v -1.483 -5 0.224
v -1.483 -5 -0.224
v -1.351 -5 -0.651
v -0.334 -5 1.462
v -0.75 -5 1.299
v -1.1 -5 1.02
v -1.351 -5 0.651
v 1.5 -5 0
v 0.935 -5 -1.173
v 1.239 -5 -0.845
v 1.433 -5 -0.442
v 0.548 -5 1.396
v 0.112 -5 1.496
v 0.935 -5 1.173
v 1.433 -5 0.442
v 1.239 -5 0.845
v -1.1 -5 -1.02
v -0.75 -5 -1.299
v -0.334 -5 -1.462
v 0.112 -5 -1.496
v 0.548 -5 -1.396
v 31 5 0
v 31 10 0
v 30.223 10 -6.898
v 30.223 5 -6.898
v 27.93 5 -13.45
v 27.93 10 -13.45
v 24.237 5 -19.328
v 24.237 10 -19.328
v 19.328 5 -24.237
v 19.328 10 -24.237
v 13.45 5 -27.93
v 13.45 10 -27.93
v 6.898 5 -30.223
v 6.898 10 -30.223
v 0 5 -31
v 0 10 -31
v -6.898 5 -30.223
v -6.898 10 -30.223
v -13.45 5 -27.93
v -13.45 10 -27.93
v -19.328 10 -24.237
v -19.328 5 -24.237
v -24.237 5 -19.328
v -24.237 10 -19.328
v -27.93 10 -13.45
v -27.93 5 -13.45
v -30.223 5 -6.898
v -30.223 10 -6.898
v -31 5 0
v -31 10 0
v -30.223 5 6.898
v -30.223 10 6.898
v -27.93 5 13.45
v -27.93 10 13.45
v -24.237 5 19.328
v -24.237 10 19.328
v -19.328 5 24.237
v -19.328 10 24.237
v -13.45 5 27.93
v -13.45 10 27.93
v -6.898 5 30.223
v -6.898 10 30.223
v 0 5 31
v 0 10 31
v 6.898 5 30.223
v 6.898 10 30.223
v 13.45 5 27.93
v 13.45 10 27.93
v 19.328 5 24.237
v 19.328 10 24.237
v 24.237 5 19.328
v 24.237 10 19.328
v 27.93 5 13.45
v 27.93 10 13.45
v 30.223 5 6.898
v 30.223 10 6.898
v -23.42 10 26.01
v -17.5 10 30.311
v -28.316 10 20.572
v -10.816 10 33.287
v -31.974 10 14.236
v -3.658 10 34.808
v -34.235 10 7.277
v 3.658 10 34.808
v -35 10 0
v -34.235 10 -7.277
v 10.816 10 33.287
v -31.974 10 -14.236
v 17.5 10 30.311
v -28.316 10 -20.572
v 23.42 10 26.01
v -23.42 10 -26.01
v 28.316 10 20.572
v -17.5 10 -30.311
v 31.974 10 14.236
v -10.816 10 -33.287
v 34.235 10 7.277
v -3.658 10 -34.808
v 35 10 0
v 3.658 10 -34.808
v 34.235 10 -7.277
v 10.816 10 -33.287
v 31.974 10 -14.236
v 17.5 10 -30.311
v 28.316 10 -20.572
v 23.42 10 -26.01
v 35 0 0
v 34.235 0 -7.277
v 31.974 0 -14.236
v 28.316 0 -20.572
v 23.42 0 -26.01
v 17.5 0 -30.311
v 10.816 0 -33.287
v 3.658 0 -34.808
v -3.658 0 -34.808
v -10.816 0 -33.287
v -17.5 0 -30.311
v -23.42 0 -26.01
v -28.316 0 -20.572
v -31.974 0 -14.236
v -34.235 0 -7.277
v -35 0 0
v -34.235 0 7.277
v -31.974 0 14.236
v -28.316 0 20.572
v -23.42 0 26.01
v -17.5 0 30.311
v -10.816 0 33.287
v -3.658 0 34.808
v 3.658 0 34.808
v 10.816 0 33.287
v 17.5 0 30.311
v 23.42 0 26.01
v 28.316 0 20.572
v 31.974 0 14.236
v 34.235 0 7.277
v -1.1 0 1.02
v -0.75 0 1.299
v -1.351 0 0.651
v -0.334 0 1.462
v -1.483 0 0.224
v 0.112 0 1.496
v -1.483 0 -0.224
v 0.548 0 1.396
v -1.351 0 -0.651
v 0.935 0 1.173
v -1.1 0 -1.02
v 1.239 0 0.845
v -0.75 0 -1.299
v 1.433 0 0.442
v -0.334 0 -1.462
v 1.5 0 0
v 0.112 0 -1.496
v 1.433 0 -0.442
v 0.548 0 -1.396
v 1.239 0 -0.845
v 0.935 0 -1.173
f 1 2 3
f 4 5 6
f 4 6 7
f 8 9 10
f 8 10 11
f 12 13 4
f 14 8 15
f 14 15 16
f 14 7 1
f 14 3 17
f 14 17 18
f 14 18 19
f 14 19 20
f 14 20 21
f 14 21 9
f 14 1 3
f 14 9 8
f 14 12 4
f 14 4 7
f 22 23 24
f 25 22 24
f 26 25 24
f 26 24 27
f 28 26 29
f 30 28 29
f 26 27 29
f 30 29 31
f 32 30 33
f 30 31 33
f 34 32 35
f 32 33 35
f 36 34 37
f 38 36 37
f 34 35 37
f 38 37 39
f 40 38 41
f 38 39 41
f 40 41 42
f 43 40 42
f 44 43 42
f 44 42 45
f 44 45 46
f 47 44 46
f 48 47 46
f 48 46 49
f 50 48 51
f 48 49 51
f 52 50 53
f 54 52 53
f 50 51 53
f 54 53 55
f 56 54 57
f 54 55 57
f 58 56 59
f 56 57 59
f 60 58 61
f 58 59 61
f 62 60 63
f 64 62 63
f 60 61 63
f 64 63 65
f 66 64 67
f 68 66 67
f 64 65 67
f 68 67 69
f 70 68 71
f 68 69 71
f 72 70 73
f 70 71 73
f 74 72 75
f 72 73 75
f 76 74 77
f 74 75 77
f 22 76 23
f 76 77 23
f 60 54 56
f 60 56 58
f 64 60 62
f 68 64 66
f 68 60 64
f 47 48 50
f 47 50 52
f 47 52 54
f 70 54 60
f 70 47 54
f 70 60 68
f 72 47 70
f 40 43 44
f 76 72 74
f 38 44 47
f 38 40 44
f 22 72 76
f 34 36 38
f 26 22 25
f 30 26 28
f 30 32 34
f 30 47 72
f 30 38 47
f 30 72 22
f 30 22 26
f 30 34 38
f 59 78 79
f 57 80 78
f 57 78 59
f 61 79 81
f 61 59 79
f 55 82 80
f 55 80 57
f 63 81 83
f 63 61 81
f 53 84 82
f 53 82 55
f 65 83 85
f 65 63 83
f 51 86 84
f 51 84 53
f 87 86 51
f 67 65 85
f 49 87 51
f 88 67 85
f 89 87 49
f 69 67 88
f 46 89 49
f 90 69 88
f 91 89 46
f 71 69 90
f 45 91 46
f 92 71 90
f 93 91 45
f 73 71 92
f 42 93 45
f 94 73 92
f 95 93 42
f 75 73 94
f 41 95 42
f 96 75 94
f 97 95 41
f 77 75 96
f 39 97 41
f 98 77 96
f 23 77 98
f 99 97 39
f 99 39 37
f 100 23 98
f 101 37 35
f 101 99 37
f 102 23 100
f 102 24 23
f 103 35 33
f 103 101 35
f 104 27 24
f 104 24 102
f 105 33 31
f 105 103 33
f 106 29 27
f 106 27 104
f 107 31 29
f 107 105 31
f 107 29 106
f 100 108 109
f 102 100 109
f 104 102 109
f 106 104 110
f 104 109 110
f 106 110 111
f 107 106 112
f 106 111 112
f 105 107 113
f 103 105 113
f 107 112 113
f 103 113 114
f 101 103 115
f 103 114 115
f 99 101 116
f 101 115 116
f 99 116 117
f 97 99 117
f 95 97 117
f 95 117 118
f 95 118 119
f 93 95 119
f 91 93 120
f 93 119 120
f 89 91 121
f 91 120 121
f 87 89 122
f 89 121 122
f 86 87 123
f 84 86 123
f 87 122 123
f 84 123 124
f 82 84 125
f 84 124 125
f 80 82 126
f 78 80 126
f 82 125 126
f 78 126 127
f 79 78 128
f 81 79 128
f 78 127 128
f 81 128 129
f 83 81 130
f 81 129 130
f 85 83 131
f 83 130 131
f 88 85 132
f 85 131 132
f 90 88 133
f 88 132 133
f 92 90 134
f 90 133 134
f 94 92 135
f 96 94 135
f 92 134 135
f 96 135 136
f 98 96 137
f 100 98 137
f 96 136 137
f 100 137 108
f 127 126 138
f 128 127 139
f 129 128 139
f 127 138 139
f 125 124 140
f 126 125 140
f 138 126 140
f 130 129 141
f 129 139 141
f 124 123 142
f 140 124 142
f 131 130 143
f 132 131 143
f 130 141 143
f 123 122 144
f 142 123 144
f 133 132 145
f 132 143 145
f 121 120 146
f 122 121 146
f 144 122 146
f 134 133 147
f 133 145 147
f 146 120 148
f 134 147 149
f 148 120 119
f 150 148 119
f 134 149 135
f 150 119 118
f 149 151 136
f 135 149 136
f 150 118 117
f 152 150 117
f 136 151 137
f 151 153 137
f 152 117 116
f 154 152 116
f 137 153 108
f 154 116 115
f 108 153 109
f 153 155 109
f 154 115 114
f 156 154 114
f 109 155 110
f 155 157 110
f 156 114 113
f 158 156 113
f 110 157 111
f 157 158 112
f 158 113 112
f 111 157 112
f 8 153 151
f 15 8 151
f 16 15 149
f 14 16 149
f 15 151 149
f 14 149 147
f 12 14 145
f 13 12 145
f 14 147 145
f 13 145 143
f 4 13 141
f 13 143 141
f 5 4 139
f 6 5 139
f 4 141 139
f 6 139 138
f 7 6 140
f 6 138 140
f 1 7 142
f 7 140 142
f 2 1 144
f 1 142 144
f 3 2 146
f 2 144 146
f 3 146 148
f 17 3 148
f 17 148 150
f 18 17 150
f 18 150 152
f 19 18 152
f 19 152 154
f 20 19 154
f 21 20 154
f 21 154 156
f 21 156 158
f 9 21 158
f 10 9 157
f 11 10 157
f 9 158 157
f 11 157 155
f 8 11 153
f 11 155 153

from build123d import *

# Parameters (mm, degrees)
SKETCH1_R           = 35
BOSS_EXTRUDE2_DEPTH = 10
SKETCH2_R           = 31
CUT_EXTRUDE1_DEPTH  = 5
SKETCH3_R           = 1.5
BOSS_EXTRUDE3_DEPTH = 5


with BuildPart() as part:
    # Sketch1 → Boss-Extrude2 (new body)
    with BuildSketch(Plane(origin=(0, 0, 0), x_dir=(1, 0, 0), z_dir=(0, 1, 0))):
        Circle(SKETCH1_R)
    extrude(amount=BOSS_EXTRUDE2_DEPTH)

    # Sketch2 → Cut-Extrude1 (cut)
    with BuildSketch(Plane(origin=(0, 10, 0), x_dir=(1, 0, 0), z_dir=(0, 1, 0))):
        Circle(SKETCH2_R)
    extrude(amount=-CUT_EXTRUDE1_DEPTH, mode=Mode.SUBTRACT)

    # Sketch3 → Boss-Extrude3 (add)
    with BuildSketch(Plane.XZ):
        Circle(SKETCH3_R)
    extrude(amount=BOSS_EXTRUDE3_DEPTH)


solid = part.part
